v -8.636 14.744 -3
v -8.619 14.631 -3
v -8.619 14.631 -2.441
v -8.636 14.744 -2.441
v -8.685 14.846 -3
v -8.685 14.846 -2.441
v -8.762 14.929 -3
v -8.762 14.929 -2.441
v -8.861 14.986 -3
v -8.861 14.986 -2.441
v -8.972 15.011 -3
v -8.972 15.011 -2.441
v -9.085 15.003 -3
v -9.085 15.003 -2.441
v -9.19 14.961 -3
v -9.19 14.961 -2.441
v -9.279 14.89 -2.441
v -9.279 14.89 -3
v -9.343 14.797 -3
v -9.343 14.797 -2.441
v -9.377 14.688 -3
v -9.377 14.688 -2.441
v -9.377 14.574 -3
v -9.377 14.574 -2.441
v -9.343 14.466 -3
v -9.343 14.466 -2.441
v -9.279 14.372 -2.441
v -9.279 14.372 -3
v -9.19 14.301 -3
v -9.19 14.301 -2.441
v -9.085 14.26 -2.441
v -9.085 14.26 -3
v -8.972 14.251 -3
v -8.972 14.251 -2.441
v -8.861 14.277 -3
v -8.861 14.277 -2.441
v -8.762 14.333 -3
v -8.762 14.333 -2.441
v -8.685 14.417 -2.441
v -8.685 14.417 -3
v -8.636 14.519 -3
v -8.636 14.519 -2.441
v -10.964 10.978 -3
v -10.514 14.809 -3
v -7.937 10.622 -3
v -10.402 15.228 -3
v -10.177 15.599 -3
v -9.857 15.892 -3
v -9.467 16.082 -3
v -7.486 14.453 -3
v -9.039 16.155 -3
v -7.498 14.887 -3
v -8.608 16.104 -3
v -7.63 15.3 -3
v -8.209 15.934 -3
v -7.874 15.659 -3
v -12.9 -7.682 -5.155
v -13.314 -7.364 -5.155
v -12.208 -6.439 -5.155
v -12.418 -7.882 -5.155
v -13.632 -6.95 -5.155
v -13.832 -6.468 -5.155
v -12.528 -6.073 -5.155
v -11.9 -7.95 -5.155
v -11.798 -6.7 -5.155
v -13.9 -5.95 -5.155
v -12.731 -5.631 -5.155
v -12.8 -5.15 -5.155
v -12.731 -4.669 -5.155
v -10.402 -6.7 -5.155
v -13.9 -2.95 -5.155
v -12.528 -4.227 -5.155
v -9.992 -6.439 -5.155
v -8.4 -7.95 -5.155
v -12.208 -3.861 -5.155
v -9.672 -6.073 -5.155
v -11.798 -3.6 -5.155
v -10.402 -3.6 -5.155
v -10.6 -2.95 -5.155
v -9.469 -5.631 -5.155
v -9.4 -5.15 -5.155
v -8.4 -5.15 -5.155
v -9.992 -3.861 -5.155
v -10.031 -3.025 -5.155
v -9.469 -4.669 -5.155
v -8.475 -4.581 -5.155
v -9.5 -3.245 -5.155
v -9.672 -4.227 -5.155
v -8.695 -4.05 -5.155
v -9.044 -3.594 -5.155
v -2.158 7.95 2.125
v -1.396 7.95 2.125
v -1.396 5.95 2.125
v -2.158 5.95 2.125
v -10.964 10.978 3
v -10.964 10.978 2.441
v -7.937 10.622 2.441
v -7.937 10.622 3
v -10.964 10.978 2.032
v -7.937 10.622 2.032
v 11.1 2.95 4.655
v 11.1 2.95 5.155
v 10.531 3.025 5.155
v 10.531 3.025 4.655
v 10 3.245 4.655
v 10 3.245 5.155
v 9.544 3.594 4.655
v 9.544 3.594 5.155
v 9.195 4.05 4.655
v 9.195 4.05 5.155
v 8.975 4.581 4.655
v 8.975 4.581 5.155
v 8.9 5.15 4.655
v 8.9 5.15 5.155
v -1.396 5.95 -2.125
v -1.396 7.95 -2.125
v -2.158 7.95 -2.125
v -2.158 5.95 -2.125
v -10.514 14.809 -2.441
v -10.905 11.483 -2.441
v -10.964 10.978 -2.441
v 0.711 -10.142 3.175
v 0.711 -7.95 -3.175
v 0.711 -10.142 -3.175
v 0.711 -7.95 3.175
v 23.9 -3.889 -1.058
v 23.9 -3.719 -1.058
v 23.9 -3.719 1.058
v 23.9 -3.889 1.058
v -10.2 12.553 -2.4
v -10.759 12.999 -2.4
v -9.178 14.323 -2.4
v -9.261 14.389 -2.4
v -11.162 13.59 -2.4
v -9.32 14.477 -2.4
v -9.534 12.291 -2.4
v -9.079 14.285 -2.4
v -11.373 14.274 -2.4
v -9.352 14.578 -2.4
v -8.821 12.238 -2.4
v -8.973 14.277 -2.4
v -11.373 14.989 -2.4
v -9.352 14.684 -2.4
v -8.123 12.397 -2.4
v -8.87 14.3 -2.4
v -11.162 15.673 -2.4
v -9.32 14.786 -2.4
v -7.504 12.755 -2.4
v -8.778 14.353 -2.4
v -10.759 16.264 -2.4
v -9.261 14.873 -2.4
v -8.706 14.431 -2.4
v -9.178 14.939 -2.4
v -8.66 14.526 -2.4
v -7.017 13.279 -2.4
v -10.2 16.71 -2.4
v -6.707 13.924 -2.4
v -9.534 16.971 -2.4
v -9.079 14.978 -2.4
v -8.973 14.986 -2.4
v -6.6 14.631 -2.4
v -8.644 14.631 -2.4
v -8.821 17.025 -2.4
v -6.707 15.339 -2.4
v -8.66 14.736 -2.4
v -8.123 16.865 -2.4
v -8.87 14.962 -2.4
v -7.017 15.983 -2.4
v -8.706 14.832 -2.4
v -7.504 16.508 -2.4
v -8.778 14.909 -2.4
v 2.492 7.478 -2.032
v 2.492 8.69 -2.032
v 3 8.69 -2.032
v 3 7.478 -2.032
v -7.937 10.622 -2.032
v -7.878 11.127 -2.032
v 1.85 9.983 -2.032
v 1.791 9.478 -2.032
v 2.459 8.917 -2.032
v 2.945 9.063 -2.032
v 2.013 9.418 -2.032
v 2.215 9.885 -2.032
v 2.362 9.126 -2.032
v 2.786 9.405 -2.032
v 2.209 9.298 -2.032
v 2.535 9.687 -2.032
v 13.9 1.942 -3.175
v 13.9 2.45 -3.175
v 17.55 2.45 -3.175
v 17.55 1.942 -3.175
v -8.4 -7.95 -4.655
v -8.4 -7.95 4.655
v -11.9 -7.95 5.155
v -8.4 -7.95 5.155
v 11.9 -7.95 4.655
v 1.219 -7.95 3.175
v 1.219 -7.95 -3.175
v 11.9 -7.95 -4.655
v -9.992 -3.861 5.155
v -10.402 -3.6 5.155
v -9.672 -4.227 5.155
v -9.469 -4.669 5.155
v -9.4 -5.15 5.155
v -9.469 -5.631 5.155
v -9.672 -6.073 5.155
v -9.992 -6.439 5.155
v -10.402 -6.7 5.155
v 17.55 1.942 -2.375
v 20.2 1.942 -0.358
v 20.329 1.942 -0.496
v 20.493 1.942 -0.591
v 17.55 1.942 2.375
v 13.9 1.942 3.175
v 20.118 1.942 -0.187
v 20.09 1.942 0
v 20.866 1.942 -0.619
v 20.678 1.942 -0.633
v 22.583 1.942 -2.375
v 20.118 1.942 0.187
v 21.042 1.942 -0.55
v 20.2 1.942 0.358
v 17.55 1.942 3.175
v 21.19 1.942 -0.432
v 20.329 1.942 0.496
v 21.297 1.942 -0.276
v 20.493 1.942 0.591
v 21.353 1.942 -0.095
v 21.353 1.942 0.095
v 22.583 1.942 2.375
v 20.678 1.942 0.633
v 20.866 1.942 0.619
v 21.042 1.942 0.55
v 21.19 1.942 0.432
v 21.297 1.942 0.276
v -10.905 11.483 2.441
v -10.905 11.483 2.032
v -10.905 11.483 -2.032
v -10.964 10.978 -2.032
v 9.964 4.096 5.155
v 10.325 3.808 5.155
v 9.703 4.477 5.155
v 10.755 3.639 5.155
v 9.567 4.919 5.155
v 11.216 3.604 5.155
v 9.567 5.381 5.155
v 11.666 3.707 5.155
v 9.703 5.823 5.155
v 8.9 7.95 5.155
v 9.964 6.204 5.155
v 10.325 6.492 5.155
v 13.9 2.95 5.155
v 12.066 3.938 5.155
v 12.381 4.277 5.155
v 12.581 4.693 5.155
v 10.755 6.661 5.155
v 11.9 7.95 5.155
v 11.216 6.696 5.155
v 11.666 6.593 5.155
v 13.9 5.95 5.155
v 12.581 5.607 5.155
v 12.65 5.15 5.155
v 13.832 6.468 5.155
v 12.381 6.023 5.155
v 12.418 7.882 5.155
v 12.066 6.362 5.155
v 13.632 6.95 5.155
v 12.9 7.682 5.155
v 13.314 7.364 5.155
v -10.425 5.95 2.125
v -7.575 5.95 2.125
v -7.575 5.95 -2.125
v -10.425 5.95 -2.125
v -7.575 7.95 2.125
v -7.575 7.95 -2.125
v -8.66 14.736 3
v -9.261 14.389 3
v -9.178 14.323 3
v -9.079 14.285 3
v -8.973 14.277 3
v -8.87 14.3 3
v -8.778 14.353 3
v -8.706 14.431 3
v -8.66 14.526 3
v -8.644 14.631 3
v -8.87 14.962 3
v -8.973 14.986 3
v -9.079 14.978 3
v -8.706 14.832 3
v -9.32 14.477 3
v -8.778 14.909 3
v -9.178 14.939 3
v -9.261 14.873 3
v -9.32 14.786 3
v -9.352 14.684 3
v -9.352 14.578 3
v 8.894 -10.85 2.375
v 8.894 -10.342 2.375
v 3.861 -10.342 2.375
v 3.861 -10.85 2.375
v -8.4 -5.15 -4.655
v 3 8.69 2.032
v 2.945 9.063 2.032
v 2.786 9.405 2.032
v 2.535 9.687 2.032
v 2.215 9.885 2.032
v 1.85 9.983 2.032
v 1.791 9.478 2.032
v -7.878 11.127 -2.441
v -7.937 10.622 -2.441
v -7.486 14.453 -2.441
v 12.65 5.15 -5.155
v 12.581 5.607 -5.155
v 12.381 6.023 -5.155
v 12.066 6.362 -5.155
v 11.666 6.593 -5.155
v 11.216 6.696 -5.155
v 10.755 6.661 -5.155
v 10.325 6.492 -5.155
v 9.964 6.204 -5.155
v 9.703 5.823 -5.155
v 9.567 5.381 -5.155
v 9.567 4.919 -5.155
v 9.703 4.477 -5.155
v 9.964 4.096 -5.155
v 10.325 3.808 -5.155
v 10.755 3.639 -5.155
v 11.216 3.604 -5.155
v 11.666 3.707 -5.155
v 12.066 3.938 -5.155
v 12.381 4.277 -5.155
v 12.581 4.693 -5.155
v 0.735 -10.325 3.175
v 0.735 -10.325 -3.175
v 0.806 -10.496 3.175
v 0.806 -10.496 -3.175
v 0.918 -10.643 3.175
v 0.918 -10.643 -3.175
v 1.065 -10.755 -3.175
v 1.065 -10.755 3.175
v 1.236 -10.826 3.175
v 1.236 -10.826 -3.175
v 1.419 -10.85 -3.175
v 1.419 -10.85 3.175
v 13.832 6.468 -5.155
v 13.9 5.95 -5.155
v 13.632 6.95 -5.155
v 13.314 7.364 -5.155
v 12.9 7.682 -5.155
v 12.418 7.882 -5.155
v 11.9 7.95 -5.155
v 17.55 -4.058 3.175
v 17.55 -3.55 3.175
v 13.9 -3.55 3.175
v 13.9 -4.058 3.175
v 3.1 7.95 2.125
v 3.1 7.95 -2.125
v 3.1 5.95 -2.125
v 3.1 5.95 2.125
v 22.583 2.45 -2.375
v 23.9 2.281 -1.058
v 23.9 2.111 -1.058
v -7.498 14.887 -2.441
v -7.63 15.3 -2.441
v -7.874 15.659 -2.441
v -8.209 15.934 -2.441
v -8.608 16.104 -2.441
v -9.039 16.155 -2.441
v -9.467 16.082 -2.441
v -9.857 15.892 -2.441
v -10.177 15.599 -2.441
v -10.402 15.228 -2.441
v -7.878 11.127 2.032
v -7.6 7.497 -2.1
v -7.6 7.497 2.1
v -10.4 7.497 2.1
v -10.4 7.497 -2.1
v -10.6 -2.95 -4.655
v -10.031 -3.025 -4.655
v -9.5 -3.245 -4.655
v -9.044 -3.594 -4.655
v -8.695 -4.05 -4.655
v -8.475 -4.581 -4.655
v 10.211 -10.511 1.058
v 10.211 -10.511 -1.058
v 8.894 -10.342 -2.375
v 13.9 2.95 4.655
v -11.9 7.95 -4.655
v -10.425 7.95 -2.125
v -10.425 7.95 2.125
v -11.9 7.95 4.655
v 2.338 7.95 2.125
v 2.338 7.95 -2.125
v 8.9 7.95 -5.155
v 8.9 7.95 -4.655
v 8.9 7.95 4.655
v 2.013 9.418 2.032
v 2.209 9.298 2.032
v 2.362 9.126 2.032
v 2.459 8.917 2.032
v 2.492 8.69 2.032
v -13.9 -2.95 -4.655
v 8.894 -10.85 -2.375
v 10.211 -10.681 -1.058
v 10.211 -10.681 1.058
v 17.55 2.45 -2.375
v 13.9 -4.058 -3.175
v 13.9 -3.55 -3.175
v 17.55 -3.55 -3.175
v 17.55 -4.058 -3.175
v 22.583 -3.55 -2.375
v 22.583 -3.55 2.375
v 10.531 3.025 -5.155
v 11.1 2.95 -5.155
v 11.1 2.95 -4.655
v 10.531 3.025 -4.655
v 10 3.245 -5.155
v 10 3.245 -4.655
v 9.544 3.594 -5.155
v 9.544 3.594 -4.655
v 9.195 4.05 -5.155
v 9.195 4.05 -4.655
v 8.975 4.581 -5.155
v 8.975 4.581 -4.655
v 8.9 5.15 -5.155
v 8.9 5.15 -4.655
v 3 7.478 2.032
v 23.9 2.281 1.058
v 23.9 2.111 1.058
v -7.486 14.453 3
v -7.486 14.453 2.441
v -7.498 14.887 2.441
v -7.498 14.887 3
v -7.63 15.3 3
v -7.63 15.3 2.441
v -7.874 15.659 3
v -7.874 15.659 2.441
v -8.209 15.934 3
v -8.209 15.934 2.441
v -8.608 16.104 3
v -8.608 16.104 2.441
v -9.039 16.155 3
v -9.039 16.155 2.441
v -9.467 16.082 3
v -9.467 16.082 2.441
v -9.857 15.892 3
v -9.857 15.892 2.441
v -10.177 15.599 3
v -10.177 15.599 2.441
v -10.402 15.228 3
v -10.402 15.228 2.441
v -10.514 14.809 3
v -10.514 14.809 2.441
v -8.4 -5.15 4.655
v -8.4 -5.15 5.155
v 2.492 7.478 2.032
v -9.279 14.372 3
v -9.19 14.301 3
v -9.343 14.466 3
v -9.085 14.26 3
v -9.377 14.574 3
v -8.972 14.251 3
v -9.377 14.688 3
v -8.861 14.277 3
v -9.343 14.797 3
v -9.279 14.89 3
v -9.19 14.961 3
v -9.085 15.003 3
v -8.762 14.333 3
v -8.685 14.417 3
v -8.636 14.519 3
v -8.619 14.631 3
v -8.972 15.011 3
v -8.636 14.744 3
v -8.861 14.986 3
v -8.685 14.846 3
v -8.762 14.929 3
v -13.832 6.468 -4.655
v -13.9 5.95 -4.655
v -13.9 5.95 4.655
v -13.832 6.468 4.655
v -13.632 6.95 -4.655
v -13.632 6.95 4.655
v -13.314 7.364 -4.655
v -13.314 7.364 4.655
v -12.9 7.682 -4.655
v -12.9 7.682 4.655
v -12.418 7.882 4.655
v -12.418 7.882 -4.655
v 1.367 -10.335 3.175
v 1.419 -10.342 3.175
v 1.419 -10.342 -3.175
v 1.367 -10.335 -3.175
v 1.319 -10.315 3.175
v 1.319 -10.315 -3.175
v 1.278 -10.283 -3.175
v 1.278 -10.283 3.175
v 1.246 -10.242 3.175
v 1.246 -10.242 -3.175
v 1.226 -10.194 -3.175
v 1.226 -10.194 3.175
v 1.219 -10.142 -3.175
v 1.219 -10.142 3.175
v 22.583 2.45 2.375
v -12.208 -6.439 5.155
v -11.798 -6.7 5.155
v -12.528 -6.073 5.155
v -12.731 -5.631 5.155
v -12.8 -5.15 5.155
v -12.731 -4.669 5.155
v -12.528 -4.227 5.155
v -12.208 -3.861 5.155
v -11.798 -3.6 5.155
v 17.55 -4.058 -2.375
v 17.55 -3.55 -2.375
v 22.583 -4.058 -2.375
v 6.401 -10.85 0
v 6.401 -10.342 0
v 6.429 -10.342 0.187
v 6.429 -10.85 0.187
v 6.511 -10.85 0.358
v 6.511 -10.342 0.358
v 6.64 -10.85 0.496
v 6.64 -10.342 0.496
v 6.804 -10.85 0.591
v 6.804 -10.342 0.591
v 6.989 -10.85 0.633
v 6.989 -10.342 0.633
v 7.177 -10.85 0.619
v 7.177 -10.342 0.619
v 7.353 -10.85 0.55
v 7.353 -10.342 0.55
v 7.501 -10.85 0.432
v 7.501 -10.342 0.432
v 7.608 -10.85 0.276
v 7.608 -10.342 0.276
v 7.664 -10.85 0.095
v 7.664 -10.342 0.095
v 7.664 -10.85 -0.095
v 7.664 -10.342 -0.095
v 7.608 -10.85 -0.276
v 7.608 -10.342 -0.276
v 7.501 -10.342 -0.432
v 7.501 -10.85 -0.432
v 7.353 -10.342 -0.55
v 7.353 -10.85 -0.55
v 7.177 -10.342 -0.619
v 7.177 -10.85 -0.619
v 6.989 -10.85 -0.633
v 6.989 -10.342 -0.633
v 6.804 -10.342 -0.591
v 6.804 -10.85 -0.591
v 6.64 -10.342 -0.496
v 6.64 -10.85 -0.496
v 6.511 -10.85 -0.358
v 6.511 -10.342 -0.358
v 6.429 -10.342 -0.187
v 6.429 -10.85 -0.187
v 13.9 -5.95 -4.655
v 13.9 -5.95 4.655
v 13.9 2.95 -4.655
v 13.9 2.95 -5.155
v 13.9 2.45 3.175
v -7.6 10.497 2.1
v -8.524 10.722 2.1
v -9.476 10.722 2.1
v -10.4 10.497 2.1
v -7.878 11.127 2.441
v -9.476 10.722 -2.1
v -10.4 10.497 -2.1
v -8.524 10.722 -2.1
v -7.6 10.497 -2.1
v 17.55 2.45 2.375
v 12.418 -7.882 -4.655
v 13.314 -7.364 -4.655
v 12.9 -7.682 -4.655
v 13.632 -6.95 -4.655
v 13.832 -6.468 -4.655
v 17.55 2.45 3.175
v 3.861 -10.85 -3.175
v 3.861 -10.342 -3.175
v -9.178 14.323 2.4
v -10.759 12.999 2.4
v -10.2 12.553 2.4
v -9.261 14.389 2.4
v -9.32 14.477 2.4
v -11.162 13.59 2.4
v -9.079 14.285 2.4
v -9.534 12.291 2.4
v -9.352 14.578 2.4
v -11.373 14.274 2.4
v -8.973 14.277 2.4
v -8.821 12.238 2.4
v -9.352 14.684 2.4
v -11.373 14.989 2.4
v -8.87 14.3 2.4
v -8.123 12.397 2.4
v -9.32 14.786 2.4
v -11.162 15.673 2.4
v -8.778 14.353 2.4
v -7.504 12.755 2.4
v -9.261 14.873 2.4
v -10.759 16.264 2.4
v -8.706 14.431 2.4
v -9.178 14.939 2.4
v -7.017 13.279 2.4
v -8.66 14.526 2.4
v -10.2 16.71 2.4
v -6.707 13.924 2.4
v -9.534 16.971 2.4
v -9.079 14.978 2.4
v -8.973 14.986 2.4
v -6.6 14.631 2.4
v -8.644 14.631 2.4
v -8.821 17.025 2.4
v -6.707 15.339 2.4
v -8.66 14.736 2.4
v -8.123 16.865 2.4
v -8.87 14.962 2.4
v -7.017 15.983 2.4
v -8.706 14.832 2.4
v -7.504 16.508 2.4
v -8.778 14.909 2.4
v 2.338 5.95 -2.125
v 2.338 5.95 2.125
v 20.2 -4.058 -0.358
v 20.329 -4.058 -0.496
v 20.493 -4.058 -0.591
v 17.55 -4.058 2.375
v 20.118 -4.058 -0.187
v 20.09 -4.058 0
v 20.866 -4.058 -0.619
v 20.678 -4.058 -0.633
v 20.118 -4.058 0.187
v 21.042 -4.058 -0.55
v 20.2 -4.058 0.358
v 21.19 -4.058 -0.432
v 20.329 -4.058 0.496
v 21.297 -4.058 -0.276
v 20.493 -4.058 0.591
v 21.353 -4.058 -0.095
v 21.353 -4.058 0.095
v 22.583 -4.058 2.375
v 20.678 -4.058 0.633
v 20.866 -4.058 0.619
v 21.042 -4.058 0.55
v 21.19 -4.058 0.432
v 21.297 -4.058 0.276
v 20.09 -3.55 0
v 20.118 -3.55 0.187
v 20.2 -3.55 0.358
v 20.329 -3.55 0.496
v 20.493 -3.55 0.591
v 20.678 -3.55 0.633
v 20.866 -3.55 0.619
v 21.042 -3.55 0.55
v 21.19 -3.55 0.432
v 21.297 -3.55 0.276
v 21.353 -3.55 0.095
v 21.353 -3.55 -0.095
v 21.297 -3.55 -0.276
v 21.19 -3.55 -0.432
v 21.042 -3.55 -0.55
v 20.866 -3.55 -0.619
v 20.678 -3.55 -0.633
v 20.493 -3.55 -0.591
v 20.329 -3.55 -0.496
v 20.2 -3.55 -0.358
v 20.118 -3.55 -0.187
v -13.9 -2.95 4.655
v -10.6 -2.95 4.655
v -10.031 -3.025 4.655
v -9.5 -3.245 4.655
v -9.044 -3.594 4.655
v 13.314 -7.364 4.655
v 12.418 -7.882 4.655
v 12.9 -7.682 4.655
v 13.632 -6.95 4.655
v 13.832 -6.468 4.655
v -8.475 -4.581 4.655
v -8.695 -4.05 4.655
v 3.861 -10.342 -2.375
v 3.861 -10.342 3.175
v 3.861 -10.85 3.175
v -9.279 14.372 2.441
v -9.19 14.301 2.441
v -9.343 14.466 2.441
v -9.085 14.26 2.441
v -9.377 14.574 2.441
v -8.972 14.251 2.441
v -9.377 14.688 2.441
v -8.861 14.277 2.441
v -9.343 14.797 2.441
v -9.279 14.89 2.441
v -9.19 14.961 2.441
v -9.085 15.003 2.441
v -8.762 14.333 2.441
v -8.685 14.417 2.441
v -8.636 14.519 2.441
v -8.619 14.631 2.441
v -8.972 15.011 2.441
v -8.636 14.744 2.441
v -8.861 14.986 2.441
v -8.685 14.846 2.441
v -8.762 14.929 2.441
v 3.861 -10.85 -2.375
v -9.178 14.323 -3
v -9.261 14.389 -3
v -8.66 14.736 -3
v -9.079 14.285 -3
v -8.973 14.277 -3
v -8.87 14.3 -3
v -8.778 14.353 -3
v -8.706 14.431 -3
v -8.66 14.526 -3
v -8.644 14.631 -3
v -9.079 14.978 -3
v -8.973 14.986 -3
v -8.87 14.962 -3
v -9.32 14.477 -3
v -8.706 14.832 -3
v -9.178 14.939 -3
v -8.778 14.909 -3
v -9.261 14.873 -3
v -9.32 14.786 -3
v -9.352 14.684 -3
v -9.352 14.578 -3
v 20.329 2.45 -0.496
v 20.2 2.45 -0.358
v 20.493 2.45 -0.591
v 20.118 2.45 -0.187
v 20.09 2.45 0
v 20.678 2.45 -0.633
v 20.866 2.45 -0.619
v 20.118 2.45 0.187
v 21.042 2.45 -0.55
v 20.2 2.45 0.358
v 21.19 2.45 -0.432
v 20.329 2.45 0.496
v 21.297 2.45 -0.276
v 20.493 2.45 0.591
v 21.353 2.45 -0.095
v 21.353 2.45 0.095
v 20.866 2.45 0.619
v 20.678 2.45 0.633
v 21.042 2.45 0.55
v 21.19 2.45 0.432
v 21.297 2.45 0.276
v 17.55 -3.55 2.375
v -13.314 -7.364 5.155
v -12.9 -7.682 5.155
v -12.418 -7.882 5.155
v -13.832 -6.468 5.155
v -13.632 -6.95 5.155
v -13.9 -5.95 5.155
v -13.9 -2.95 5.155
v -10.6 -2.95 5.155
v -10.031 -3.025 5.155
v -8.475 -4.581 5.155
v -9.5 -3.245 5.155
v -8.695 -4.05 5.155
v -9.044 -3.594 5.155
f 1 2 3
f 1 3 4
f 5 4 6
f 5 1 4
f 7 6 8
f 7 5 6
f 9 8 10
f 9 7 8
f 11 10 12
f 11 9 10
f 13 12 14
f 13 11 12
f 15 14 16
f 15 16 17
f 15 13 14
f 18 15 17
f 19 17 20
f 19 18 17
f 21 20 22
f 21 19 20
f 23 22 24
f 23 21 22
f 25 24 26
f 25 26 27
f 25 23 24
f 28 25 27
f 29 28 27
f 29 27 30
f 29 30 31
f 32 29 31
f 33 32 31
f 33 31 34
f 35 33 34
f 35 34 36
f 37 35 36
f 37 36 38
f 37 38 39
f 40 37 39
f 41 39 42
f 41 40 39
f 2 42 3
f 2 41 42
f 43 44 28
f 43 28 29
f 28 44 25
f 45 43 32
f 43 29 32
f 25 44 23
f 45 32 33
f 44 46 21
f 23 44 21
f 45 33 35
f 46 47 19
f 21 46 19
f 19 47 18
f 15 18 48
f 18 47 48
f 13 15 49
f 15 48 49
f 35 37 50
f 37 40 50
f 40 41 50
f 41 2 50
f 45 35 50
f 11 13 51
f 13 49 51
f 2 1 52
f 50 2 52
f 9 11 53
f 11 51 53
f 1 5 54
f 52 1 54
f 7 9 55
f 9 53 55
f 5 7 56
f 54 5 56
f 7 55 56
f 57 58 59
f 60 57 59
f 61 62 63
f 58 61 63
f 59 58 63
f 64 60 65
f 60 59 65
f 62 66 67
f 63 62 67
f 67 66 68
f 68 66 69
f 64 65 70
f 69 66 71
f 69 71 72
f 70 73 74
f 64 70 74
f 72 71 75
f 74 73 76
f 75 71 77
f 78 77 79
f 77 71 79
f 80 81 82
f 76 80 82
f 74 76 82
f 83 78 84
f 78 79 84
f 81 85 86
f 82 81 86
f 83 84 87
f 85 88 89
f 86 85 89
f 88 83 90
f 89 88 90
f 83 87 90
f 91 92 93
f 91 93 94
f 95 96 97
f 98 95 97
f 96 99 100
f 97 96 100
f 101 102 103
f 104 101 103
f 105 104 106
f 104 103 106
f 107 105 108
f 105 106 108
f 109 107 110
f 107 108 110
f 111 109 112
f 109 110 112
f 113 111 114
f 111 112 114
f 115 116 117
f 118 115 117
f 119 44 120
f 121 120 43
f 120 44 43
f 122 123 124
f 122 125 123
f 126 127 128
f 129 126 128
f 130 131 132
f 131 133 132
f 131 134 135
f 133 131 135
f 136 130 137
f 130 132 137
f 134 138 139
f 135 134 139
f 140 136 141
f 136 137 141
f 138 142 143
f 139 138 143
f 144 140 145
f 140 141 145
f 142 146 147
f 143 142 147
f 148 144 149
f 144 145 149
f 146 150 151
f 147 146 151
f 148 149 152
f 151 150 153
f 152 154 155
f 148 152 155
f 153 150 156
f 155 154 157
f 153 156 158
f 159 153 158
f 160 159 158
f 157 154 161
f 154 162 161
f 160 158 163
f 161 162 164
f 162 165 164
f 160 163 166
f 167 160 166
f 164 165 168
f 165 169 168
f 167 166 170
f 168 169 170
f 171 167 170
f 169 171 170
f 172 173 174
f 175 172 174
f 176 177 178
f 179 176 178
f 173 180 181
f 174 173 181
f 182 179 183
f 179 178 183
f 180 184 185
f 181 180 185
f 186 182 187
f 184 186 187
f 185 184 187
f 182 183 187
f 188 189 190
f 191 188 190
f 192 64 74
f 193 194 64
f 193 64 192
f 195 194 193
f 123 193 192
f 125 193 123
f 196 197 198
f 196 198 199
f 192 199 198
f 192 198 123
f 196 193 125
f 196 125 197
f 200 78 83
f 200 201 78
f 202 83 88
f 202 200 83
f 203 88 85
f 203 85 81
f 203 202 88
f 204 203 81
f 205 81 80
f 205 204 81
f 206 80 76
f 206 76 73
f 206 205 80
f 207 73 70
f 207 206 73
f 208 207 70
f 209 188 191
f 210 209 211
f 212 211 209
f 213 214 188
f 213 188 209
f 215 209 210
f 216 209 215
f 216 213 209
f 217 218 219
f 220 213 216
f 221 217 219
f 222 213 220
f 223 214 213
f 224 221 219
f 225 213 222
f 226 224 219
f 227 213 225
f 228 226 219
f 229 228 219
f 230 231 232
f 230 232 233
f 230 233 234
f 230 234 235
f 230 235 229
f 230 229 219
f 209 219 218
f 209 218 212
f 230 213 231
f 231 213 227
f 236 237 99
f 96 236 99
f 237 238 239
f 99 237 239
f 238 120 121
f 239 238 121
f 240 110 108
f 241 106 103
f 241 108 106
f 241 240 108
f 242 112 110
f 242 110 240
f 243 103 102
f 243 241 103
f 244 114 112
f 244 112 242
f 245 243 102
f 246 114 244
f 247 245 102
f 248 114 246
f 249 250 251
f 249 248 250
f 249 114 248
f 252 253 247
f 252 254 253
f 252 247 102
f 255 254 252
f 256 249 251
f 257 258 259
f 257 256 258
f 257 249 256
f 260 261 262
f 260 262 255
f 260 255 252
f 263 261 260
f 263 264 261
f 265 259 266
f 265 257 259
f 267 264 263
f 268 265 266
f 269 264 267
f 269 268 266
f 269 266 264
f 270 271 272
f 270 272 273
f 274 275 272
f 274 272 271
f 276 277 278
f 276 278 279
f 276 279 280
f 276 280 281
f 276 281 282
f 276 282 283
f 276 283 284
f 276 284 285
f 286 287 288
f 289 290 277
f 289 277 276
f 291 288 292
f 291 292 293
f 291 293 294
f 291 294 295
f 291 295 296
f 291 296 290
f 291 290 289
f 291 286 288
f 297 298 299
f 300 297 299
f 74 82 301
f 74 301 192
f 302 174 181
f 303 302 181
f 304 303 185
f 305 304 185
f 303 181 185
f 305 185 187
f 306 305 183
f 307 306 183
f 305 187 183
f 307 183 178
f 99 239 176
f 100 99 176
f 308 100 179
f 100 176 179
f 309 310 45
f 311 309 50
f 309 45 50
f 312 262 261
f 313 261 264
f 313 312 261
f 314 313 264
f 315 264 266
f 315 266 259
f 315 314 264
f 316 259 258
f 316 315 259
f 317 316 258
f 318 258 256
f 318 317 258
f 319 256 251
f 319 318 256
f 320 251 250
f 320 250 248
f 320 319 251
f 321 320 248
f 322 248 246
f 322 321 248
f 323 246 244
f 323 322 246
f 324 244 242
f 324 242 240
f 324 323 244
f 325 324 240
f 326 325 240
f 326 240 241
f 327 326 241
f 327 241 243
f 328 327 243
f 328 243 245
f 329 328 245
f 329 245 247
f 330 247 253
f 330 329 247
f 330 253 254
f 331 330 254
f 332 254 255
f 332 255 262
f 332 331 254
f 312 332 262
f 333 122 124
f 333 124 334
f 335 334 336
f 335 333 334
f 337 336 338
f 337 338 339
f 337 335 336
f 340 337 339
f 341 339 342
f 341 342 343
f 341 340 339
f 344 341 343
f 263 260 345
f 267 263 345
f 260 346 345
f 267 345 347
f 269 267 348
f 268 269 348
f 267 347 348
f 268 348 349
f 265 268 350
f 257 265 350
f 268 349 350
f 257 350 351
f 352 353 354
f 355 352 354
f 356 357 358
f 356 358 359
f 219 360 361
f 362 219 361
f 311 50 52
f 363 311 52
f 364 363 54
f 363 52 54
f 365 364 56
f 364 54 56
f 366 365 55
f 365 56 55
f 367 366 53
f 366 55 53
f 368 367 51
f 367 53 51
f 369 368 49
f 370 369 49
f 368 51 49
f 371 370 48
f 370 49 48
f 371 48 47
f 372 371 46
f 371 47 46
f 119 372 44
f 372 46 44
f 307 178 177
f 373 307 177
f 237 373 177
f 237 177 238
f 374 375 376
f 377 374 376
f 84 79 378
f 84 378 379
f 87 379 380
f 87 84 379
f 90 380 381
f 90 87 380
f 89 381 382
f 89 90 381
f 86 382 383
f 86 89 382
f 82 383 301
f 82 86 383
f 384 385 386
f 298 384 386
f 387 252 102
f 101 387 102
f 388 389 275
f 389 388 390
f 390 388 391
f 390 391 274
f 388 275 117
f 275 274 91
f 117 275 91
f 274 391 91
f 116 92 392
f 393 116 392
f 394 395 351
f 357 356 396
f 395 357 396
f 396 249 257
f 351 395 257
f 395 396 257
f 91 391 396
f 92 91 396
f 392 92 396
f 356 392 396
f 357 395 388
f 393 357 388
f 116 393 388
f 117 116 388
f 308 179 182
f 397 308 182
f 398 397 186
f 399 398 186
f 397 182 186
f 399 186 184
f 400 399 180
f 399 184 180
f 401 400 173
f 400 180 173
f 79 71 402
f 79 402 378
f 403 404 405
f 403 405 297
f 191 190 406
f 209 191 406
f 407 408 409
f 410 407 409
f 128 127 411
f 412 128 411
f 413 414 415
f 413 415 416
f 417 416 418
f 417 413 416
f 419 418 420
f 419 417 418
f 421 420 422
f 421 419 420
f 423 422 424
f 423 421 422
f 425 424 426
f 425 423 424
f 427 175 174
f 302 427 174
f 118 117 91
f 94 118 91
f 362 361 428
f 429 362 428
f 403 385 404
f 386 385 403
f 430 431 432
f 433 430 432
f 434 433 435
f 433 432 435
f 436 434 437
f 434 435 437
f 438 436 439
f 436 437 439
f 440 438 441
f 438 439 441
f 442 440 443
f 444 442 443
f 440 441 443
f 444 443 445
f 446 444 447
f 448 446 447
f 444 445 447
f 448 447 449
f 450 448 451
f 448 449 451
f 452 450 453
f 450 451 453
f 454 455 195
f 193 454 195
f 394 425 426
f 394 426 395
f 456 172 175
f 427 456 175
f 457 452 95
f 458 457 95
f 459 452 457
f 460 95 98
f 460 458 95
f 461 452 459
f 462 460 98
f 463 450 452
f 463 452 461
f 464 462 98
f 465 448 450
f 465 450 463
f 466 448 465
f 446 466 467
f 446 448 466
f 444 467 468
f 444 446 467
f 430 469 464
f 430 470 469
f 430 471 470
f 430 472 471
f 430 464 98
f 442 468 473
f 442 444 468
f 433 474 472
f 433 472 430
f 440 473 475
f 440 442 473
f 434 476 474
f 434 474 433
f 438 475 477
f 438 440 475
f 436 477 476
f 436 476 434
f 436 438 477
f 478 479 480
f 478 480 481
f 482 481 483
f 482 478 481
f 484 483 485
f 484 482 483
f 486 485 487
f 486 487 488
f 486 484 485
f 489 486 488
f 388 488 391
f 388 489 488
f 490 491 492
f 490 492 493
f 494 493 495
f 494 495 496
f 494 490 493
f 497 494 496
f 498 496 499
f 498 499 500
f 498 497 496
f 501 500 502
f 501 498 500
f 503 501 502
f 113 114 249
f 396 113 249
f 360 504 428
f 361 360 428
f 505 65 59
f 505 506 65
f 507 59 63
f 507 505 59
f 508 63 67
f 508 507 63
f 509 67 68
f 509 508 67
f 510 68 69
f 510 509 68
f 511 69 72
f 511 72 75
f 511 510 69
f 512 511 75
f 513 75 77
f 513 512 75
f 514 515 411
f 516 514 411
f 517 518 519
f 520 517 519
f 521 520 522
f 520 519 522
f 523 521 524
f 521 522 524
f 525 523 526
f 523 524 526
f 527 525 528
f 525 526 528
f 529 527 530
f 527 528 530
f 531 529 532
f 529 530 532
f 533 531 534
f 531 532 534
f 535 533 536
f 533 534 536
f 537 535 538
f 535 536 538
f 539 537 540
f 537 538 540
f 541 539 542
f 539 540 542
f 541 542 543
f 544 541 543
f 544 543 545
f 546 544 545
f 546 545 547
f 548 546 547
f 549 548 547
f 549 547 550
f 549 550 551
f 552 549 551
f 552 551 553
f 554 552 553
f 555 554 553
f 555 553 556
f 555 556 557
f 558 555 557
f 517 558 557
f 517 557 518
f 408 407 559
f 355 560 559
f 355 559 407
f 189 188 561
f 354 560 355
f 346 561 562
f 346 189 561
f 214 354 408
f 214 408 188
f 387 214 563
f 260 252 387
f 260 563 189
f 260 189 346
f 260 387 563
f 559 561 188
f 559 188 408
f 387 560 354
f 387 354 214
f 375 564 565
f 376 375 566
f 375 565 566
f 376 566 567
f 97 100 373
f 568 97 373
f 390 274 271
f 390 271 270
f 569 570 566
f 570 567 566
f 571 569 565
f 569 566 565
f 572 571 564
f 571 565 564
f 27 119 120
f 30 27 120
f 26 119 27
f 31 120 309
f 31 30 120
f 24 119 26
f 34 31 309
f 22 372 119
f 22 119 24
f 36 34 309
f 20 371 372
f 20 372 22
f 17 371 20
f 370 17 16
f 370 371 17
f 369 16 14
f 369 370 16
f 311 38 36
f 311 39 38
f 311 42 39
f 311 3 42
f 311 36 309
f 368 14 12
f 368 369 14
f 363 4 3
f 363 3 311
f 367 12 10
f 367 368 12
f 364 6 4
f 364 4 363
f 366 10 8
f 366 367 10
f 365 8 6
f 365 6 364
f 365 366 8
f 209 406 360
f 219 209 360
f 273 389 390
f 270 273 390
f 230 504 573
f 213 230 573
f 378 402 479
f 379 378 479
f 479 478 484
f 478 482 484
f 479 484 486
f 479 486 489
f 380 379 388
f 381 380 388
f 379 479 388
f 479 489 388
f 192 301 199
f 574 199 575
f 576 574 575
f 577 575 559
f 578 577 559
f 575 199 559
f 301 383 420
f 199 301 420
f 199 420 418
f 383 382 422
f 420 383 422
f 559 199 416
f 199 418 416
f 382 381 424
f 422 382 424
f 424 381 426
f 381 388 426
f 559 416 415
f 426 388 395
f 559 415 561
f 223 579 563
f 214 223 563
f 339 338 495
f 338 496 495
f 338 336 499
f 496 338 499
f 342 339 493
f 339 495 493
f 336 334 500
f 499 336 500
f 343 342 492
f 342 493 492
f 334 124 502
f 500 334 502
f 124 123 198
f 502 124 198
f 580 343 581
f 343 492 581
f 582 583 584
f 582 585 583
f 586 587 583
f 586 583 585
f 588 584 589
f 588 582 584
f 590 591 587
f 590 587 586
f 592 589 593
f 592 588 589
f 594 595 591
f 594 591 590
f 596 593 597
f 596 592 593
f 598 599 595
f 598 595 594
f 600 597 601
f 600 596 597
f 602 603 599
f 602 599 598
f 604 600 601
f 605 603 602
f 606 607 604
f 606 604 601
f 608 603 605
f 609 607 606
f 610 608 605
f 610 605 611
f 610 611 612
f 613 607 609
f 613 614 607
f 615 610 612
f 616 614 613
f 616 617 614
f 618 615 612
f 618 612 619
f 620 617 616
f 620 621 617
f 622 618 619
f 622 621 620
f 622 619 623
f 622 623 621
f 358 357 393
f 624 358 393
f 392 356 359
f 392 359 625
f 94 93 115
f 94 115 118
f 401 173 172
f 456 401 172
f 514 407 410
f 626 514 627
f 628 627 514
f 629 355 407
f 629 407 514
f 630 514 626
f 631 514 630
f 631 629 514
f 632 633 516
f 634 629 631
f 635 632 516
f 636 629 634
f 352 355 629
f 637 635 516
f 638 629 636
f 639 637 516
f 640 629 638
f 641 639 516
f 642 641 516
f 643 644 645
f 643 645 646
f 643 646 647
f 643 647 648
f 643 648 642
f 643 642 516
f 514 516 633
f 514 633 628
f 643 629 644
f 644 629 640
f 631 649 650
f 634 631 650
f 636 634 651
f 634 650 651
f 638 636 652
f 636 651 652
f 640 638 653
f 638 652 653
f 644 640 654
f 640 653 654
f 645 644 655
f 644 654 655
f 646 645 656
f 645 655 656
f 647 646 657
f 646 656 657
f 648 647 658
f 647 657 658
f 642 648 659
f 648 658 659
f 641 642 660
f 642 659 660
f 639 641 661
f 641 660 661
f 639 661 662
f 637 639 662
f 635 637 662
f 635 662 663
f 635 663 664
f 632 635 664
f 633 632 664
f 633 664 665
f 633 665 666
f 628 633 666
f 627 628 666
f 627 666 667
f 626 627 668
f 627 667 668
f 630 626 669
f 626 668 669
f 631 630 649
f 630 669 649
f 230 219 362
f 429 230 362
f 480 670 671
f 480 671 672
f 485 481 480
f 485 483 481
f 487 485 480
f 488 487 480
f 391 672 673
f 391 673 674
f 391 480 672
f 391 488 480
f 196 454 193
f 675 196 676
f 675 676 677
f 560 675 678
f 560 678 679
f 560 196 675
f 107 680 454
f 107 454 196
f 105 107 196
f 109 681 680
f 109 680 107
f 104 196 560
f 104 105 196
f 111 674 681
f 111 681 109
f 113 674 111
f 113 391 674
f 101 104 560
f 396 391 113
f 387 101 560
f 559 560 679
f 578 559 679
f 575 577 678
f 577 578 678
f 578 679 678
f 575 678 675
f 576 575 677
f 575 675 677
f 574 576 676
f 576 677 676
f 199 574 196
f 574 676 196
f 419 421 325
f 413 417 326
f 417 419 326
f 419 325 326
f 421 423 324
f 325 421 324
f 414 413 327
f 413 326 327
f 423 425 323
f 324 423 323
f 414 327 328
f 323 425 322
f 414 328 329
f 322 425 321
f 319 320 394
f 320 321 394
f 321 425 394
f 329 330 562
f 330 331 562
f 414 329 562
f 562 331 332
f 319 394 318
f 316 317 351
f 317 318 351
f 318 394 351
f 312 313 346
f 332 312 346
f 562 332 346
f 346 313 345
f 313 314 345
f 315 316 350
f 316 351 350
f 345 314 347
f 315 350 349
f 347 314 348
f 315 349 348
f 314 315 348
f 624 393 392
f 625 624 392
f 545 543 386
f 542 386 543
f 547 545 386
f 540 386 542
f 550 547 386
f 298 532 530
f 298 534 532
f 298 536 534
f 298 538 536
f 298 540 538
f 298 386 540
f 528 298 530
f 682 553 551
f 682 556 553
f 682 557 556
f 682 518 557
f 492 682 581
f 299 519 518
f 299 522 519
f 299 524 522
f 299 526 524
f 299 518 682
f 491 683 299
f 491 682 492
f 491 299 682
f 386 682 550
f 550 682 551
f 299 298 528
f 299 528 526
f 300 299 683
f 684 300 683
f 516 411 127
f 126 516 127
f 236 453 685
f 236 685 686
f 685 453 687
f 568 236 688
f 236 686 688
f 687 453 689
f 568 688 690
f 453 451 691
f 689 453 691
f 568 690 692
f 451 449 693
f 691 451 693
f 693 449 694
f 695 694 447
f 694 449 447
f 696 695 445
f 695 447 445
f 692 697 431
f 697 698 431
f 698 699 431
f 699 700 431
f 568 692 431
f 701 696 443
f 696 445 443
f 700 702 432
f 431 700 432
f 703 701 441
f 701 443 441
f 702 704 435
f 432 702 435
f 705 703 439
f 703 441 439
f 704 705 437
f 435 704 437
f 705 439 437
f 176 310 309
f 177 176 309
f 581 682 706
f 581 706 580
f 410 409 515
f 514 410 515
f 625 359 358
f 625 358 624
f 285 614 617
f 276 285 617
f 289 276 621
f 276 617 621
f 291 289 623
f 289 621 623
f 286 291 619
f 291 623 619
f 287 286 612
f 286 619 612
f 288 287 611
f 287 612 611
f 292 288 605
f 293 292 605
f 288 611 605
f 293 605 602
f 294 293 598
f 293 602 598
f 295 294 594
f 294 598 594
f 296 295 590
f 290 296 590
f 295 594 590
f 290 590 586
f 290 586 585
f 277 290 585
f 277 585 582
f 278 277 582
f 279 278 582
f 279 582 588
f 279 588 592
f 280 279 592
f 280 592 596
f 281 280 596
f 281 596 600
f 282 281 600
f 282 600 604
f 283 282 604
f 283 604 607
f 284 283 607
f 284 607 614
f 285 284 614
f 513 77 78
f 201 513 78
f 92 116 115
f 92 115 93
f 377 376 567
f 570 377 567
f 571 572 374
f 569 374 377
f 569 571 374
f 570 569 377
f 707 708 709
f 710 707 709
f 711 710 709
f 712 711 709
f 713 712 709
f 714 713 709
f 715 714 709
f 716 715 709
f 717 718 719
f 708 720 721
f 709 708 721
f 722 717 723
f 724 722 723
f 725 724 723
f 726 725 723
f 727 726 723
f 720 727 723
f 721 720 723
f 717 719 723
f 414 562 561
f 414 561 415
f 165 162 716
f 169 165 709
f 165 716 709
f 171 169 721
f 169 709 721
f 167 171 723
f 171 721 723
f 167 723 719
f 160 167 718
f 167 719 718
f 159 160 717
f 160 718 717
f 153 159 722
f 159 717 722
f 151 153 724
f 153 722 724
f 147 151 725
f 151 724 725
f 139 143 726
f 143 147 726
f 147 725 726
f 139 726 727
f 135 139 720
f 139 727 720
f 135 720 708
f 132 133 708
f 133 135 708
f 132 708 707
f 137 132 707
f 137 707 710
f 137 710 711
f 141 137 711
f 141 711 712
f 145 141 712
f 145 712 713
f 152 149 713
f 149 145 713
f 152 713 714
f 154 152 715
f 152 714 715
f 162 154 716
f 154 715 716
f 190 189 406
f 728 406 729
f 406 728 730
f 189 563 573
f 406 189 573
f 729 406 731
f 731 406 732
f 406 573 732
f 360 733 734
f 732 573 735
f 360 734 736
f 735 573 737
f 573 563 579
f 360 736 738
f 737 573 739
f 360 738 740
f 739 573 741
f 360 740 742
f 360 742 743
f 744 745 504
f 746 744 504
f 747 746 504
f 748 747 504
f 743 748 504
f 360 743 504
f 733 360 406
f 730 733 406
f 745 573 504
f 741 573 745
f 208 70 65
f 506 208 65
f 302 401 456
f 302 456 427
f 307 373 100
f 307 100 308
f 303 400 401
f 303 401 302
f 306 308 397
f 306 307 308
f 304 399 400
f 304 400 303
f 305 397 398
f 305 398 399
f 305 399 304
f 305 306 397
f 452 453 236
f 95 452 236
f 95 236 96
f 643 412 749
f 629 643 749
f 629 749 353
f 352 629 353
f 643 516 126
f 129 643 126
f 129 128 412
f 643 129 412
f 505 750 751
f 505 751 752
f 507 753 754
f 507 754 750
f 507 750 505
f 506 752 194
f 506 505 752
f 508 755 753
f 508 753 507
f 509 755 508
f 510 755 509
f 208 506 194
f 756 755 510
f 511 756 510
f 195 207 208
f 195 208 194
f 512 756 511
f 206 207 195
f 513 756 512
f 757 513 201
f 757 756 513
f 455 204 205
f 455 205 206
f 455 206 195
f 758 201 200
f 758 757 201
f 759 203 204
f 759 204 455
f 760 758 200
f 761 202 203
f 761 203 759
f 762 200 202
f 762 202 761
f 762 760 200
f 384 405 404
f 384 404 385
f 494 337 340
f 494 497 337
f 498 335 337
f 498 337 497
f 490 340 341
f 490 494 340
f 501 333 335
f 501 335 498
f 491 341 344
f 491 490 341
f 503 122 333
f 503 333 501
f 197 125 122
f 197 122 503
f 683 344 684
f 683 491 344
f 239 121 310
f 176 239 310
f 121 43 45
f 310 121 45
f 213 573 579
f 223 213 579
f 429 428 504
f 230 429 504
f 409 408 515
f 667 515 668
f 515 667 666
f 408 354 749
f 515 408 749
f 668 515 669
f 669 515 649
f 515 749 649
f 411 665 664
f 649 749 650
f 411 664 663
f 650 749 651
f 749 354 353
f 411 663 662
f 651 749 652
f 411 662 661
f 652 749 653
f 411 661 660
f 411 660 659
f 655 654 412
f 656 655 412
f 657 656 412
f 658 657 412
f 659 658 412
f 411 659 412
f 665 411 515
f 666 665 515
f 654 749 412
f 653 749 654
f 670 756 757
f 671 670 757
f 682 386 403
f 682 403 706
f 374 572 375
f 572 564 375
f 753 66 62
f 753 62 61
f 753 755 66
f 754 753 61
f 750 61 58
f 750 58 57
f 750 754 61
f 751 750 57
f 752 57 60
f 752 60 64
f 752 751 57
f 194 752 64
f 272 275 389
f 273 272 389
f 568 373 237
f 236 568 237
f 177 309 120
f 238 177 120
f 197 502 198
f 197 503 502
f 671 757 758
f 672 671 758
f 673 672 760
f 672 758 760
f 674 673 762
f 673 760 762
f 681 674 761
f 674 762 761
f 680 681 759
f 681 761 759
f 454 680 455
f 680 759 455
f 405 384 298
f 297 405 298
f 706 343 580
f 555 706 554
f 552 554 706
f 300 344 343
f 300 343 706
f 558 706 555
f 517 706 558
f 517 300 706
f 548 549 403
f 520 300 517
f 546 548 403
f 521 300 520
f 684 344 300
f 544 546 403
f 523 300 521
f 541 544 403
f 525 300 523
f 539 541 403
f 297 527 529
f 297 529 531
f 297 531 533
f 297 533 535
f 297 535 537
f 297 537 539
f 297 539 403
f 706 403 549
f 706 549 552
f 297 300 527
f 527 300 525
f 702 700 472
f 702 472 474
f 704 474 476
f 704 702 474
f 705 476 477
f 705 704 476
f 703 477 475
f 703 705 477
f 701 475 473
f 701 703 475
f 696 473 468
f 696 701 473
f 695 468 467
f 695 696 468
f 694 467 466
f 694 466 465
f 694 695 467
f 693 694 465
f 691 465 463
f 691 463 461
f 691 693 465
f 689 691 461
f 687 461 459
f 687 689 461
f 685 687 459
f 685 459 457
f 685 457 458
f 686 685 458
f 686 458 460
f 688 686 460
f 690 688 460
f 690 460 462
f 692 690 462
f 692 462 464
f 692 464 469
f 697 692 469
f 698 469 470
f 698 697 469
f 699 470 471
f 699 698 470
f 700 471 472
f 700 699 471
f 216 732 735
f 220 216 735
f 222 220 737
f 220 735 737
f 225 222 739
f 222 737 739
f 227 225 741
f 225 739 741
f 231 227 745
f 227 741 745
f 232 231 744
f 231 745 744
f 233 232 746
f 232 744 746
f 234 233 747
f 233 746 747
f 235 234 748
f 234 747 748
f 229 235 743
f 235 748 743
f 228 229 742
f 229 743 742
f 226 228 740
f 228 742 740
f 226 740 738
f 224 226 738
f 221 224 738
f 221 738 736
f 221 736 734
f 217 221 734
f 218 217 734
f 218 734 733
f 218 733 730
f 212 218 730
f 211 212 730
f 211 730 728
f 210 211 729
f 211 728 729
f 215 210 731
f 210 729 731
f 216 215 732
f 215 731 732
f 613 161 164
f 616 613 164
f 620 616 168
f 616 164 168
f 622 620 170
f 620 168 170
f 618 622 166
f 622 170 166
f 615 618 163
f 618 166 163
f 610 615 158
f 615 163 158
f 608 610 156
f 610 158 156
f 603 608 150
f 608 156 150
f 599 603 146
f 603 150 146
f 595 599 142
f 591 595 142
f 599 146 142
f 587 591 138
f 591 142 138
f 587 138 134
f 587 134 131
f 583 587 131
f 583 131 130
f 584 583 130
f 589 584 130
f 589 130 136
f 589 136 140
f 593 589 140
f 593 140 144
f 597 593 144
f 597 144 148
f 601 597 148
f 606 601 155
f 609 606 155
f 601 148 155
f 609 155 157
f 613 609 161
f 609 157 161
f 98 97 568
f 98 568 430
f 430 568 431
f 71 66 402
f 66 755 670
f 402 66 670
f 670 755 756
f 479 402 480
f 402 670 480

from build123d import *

# Parameters (mm, degrees)
SKETCH1_W               = 27.8
SKETCH1_H               = 15.9
SKETCH1_R               = 1.55
EXTRUDE1_DEPTH          = 5.155
FILLET1_R               = 2
EXTRUDE2_DEPTH          = 2.1
SKETCH3_W               = 2.8508
SKETCH3_H               = 4.2508
SKETCH3_W_2             = 0.762
CUT_EXTRUDE1_DEPTH      = 2
CUT_EXTRUDE2_DEPTH      = 0.5
EXTRUDE3_DEPTH          = 3.175
SKETCH6_R               = 0.635
CUT_EXTRUDE3_DEPTH      = 26.780932664
EXTRUDE4_START          = -5.5
SKETCH8_R               = 0.635
EXTRUDE4_DEPTH          = 0.508
LPATTERN1_COUNT         = 2
LPATTERN1_PITCH         = 6
CUT_EXTRUDE4_DEPTH      = 27.748953718
CUT_EXTRUDE4_DEPTH_BACK = 27.748953718
ROLLER_START            = -2.032
ROLLER_DEPTH            = 4.064
ROLLER_START_2          = -3
ROLLER_2_OUTLINE_R      = 0.381
ROLLER_2_DEPTH          = 0.5588
ROLLER_START_3          = 2.4412
ROLLER_3_OUTLINE_R      = 0.381
ROLLER_3_DEPTH          = 0.5588
ROLLER_START_4          = -2.4412
ROLLER_4_DEPTH          = 4.8824
ROLLER_START_5          = -2.4
ROLLER_5_OUTLINE_R      = 2.4
ROLLER_5_DEPTH          = 4.8
ROLLER_6_OUTLINE_R      = 0.3556
ROLLER_6_DEPTH          = 6


# Read off the part's stored shape, not the designer's step: Roller
with BuildPart() as part:
    # Sketch1 → Extrude1 (new, symmetric)
    with BuildSketch(Plane.XY):
        Rectangle(SKETCH1_W, SKETCH1_H)
        with Locations((11.1, 5.15)):
            Circle(SKETCH1_R, mode=Mode.SUBTRACT)
        with BuildLine():
            Line((-11.798212002, -3.6), (-10.401787998, -3.6))
            ThreePointArc((-10.401787998, -3.6), (-9.4, -5.15), (-10.401787998, -6.7))
            Line((-10.401787998, -6.7), (-11.798212002, -6.7))
            ThreePointArc((-11.798212002, -6.7), (-12.8, -5.15), (-11.798212002, -3.6))
        make_face(mode=Mode.SUBTRACT)
    extrude(amount=EXTRUDE1_DEPTH, both=True)

    # Fillet1
    fillet1_edges = [part.edges().sort_by_distance(p)[0] for p in [
        (-13.9, 7.95, 0),
        (13.9, 7.95, 0),
        (13.9, -7.95, 0),
        (-13.9, -7.95, 0),
    ]]
    fillet(fillet1_edges, radius=FILLET1_R)

    # Sketch3 → Cut-Extrude1 (cut)
    with BuildSketch(Plane(origin=(0, 7.95, 0), x_dir=(-1, 0, 0), z_dir=(0, 1, 0))):
        with Locations((9, 0)):
            Rectangle(SKETCH3_W, SKETCH3_H)
        with Locations((1.7768, 0)):
            Rectangle(SKETCH3_W_2, SKETCH3_H)
        with Locations((-2.719, 0)):
            Rectangle(SKETCH3_W_2, SKETCH3_H)
    extrude(amount=-CUT_EXTRUDE1_DEPTH, mode=Mode.SUBTRACT)

    # Sketch4 → Cut-Extrude2 (cut)
    with BuildSketch(Plane.XY.offset(5.155)):
        with BuildLine():
            Line((-8.4, -7.95), (13.9, -7.95))
            Line((13.9, -7.95), (13.9, 2.95))
            Line((13.9, 2.95), (11.1, 2.95))
            ThreePointArc((11.1, 2.95), (9.544365081, 3.594365081), (8.9, 5.15))
            Line((8.9, 5.15), (8.9, 7.95))
            Line((8.9, 7.95), (-13.9, 7.95))
            Line((-13.9, 7.95), (-13.9, -2.95))
            Line((-13.9, -2.95), (-10.6, -2.95))
            ThreePointArc((-10.6, -2.95), (-9.044365081, -3.594365081), (-8.4, -5.15))
            Line((-8.4, -5.15), (-8.4, -7.95))
        make_face()
    cut_extrude2 = extrude(amount=-CUT_EXTRUDE2_DEPTH, mode=Mode.SUBTRACT)

    # Mirror1: Cut-Extrude2 across plane
    add(cut_extrude2.mirror(Plane.XY), mode=Mode.SUBTRACT)

    # Sketch5 → Extrude3 (add, symmetric)
    with BuildSketch(Plane.XY):
        with BuildLine():
            Line((0.711, -7.95), (0.711, -10.142))
            ThreePointArc((0.711, -10.142), (0.918368399, -10.642631601), (1.419, -10.85))
            Line((1.419, -10.85), (10.211, -10.85))
            Line((10.211, -10.85), (10.211, -10.342))
            Line((10.211, -10.342), (1.419, -10.342))
            ThreePointArc((1.419, -10.342), (1.277578644, -10.283421356), (1.219, -10.142))
            Line((1.219, -10.142), (1.219, -7.95))
            Line((1.219, -7.95), (0.711, -7.95))
        make_face()
    extrude(amount=EXTRUDE3_DEPTH, both=True)

    # Sketch6 → Cut-Extrude3 (cut, through all)
    with BuildSketch(Plane(origin=(0, -10.342, 0), x_dir=(-1, 0, 0), z_dir=(0, 1, 0))):
        with Locations((-7.036, 0)):
            Circle(SKETCH6_R)
        Polygon((-10.211, 1.058333333), (-8.894433333, 2.3749), (-3.861, 2.3749), (-3.861, 3.175), (-10.211, 3.175), align=None)
        Polygon((-10.211, -3.175), (-10.211, -1.058333333), (-8.894433333, -2.3749), (-3.861, -2.3749), (-3.861, -3.175), align=None)
    extrude(amount=-CUT_EXTRUDE3_DEPTH, mode=Mode.SUBTRACT)

    # Sketch8 → Extrude4 (add)
    with BuildSketch(Plane(origin=(0, 7.95, 0), x_dir=(-1, 0, 0), z_dir=(0, 1, 0)).offset(EXTRUDE4_START)):
        Polygon((-13.9, -3.175), (-17.55, -3.175), (-17.55, -2.3749), (-22.583433333, -2.3749), (-23.9, -1.058333333), (-23.9, 1.058333333), (-22.583433333, 2.3749), (-17.55, 2.3749), (-17.55, 3.175), (-13.9, 3.175), align=None)
        with Locations((-20.725, 0)):
            Circle(SKETCH8_R, mode=Mode.SUBTRACT)
    extrude4 = extrude(amount=-EXTRUDE4_DEPTH)

    # LPattern1: Extrude4 ×2
    with Locations(*[(0, -i * LPATTERN1_PITCH, 0) for i in range(1, LPATTERN1_COUNT)]):
        add(extrude4)

    # Sketch7 → Cut-Extrude4 (cut, two sides: drawn at the far end of the back side and taken through both)
    with BuildSketch(Plane.XY.offset(-CUT_EXTRUDE4_DEPTH_BACK)):
        Polygon((8.894433333, -10.342), (10.211, -10.342), (10.211, -10.511333333), align=None)
        Polygon((8.894433333, -10.85), (10.211, -10.85), (10.211, -10.680666667), align=None)
        Polygon((23.9, -3.719333333), (22.583433333, -3.55), (23.9, -3.55), align=None)
        Polygon((23.9, -3.888666667), (23.9, -4.058), (22.583433333, -4.058), align=None)
        Polygon((22.583433333, 2.45), (23.9, 2.280666667), (23.9, 2.45), align=None)
        Polygon((23.9, 2.111333333), (23.9, 1.942), (22.583433333, 1.942), align=None)
    extrude(amount=CUT_EXTRUDE4_DEPTH + CUT_EXTRUDE4_DEPTH_BACK, mode=Mode.SUBTRACT)


with BuildPart() as body_2:
    # Sketch2 → Extrude2 (new, symmetric)
    with BuildSketch(Plane.XY):
        with BuildLine():
            Line((-10.4, 7.496998799), (-10.4, 10.496998799))
            ThreePointArc((-10.4, 10.496998799), (-9, 10.75), (-7.6, 10.496998799))
            Line((-7.6, 10.496998799), (-7.6, 7.496998799))
            Line((-7.6, 7.496998799), (-10.4, 7.496998799))
        make_face()
    extrude(amount=EXTRUDE2_DEPTH, both=True)


with BuildPart() as body_3:
    # Roller outline → Roller (new body)
    with BuildSketch(Plane.XY.offset(ROLLER_START)):
        with BuildLine():
            Line((-10.904788918, 11.48255895), (-10.964120967, 10.978035702))
            Line((-10.964120967, 10.978035702), (1.790956327, 9.478035702))
            ThreePointArc((1.790956327, 9.478035702), (2.29138772, 9.217190124), (2.492, 8.689718127))
            Line((2.492, 8.689718127), (2.492, 7.478248799))
            Line((2.492, 7.478248799), (3, 7.478248799))
            Line((3, 7.478248799), (3, 8.689718127))
            ThreePointArc((3, 8.689718127), (2.67099586, 9.554772202), (1.850288376, 9.98255895))
            Line((1.850288376, 9.98255895), (-10.904788918, 11.48255895))
        make_face()
    extrude(amount=ROLLER_DEPTH)

    # Roller 2 outline → Roller 2 (add)
    with BuildSketch(Plane.XY.offset(ROLLER_START_2)):
        with BuildLine():
            Line((-10.513569745, 14.809246147), (-10.964120967, 10.978035702))
            Line((-10.964120967, 10.978035702), (-7.936981478, 10.622043407))
            Line((-7.936981478, 10.622043407), (-7.486430255, 14.453253853))
            ThreePointArc((-7.486430255, 14.453253853), (-8.822003853, 16.144819745), (-10.513569745, 14.809246147))
        make_face()
        with Locations((-9, 14.63125)):
            Circle(ROLLER_2_OUTLINE_R, mode=Mode.SUBTRACT)
    extrude(amount=ROLLER_2_DEPTH)

    # Roller 3 outline → Roller 3 (add)
    with BuildSketch(Plane.XY.offset(ROLLER_START_3)):
        with BuildLine():
            Line((-10.513569745, 14.809246147), (-10.964120967, 10.978035702))
            Line((-10.964120967, 10.978035702), (-7.936981478, 10.622043407))
            Line((-7.936981478, 10.622043407), (-7.486430255, 14.453253853))
            ThreePointArc((-7.486430255, 14.453253853), (-8.822003853, 16.144819745), (-10.513569745, 14.809246147))
        make_face()
        with Locations((-9, 14.63125)):
            Circle(ROLLER_3_OUTLINE_R, mode=Mode.SUBTRACT)
    extrude(amount=ROLLER_3_DEPTH)

    # Roller 4 outline → Roller 4 (add)
    with BuildSketch(Plane.XY.offset(ROLLER_START_4)):
        Polygon((-7.877649429, 11.126566655), (-10.904788918, 11.48255895), (-10.964120967, 10.978035702), (-7.936981478, 10.622043407), align=None)
    extrude(amount=ROLLER_4_DEPTH)


with BuildPart() as body_4:
    # Roller 5 outline → Roller 5 (new body)
    with BuildSketch(Plane.XY.offset(ROLLER_START_5)):
        with Locations((-9, 14.63125)):
            Circle(ROLLER_5_OUTLINE_R)
    extrude(amount=ROLLER_5_DEPTH)

    # Roller 6 outline → Roller 6 (add)
    with BuildSketch(Plane.XY.offset(ROLLER_START_2)):
        with Locations((-9, 14.63125)):
            Circle(ROLLER_6_OUTLINE_R)
    extrude(amount=ROLLER_6_DEPTH)


solid = Compound([part.part, body_2.part, body_3.part, body_4.part])
